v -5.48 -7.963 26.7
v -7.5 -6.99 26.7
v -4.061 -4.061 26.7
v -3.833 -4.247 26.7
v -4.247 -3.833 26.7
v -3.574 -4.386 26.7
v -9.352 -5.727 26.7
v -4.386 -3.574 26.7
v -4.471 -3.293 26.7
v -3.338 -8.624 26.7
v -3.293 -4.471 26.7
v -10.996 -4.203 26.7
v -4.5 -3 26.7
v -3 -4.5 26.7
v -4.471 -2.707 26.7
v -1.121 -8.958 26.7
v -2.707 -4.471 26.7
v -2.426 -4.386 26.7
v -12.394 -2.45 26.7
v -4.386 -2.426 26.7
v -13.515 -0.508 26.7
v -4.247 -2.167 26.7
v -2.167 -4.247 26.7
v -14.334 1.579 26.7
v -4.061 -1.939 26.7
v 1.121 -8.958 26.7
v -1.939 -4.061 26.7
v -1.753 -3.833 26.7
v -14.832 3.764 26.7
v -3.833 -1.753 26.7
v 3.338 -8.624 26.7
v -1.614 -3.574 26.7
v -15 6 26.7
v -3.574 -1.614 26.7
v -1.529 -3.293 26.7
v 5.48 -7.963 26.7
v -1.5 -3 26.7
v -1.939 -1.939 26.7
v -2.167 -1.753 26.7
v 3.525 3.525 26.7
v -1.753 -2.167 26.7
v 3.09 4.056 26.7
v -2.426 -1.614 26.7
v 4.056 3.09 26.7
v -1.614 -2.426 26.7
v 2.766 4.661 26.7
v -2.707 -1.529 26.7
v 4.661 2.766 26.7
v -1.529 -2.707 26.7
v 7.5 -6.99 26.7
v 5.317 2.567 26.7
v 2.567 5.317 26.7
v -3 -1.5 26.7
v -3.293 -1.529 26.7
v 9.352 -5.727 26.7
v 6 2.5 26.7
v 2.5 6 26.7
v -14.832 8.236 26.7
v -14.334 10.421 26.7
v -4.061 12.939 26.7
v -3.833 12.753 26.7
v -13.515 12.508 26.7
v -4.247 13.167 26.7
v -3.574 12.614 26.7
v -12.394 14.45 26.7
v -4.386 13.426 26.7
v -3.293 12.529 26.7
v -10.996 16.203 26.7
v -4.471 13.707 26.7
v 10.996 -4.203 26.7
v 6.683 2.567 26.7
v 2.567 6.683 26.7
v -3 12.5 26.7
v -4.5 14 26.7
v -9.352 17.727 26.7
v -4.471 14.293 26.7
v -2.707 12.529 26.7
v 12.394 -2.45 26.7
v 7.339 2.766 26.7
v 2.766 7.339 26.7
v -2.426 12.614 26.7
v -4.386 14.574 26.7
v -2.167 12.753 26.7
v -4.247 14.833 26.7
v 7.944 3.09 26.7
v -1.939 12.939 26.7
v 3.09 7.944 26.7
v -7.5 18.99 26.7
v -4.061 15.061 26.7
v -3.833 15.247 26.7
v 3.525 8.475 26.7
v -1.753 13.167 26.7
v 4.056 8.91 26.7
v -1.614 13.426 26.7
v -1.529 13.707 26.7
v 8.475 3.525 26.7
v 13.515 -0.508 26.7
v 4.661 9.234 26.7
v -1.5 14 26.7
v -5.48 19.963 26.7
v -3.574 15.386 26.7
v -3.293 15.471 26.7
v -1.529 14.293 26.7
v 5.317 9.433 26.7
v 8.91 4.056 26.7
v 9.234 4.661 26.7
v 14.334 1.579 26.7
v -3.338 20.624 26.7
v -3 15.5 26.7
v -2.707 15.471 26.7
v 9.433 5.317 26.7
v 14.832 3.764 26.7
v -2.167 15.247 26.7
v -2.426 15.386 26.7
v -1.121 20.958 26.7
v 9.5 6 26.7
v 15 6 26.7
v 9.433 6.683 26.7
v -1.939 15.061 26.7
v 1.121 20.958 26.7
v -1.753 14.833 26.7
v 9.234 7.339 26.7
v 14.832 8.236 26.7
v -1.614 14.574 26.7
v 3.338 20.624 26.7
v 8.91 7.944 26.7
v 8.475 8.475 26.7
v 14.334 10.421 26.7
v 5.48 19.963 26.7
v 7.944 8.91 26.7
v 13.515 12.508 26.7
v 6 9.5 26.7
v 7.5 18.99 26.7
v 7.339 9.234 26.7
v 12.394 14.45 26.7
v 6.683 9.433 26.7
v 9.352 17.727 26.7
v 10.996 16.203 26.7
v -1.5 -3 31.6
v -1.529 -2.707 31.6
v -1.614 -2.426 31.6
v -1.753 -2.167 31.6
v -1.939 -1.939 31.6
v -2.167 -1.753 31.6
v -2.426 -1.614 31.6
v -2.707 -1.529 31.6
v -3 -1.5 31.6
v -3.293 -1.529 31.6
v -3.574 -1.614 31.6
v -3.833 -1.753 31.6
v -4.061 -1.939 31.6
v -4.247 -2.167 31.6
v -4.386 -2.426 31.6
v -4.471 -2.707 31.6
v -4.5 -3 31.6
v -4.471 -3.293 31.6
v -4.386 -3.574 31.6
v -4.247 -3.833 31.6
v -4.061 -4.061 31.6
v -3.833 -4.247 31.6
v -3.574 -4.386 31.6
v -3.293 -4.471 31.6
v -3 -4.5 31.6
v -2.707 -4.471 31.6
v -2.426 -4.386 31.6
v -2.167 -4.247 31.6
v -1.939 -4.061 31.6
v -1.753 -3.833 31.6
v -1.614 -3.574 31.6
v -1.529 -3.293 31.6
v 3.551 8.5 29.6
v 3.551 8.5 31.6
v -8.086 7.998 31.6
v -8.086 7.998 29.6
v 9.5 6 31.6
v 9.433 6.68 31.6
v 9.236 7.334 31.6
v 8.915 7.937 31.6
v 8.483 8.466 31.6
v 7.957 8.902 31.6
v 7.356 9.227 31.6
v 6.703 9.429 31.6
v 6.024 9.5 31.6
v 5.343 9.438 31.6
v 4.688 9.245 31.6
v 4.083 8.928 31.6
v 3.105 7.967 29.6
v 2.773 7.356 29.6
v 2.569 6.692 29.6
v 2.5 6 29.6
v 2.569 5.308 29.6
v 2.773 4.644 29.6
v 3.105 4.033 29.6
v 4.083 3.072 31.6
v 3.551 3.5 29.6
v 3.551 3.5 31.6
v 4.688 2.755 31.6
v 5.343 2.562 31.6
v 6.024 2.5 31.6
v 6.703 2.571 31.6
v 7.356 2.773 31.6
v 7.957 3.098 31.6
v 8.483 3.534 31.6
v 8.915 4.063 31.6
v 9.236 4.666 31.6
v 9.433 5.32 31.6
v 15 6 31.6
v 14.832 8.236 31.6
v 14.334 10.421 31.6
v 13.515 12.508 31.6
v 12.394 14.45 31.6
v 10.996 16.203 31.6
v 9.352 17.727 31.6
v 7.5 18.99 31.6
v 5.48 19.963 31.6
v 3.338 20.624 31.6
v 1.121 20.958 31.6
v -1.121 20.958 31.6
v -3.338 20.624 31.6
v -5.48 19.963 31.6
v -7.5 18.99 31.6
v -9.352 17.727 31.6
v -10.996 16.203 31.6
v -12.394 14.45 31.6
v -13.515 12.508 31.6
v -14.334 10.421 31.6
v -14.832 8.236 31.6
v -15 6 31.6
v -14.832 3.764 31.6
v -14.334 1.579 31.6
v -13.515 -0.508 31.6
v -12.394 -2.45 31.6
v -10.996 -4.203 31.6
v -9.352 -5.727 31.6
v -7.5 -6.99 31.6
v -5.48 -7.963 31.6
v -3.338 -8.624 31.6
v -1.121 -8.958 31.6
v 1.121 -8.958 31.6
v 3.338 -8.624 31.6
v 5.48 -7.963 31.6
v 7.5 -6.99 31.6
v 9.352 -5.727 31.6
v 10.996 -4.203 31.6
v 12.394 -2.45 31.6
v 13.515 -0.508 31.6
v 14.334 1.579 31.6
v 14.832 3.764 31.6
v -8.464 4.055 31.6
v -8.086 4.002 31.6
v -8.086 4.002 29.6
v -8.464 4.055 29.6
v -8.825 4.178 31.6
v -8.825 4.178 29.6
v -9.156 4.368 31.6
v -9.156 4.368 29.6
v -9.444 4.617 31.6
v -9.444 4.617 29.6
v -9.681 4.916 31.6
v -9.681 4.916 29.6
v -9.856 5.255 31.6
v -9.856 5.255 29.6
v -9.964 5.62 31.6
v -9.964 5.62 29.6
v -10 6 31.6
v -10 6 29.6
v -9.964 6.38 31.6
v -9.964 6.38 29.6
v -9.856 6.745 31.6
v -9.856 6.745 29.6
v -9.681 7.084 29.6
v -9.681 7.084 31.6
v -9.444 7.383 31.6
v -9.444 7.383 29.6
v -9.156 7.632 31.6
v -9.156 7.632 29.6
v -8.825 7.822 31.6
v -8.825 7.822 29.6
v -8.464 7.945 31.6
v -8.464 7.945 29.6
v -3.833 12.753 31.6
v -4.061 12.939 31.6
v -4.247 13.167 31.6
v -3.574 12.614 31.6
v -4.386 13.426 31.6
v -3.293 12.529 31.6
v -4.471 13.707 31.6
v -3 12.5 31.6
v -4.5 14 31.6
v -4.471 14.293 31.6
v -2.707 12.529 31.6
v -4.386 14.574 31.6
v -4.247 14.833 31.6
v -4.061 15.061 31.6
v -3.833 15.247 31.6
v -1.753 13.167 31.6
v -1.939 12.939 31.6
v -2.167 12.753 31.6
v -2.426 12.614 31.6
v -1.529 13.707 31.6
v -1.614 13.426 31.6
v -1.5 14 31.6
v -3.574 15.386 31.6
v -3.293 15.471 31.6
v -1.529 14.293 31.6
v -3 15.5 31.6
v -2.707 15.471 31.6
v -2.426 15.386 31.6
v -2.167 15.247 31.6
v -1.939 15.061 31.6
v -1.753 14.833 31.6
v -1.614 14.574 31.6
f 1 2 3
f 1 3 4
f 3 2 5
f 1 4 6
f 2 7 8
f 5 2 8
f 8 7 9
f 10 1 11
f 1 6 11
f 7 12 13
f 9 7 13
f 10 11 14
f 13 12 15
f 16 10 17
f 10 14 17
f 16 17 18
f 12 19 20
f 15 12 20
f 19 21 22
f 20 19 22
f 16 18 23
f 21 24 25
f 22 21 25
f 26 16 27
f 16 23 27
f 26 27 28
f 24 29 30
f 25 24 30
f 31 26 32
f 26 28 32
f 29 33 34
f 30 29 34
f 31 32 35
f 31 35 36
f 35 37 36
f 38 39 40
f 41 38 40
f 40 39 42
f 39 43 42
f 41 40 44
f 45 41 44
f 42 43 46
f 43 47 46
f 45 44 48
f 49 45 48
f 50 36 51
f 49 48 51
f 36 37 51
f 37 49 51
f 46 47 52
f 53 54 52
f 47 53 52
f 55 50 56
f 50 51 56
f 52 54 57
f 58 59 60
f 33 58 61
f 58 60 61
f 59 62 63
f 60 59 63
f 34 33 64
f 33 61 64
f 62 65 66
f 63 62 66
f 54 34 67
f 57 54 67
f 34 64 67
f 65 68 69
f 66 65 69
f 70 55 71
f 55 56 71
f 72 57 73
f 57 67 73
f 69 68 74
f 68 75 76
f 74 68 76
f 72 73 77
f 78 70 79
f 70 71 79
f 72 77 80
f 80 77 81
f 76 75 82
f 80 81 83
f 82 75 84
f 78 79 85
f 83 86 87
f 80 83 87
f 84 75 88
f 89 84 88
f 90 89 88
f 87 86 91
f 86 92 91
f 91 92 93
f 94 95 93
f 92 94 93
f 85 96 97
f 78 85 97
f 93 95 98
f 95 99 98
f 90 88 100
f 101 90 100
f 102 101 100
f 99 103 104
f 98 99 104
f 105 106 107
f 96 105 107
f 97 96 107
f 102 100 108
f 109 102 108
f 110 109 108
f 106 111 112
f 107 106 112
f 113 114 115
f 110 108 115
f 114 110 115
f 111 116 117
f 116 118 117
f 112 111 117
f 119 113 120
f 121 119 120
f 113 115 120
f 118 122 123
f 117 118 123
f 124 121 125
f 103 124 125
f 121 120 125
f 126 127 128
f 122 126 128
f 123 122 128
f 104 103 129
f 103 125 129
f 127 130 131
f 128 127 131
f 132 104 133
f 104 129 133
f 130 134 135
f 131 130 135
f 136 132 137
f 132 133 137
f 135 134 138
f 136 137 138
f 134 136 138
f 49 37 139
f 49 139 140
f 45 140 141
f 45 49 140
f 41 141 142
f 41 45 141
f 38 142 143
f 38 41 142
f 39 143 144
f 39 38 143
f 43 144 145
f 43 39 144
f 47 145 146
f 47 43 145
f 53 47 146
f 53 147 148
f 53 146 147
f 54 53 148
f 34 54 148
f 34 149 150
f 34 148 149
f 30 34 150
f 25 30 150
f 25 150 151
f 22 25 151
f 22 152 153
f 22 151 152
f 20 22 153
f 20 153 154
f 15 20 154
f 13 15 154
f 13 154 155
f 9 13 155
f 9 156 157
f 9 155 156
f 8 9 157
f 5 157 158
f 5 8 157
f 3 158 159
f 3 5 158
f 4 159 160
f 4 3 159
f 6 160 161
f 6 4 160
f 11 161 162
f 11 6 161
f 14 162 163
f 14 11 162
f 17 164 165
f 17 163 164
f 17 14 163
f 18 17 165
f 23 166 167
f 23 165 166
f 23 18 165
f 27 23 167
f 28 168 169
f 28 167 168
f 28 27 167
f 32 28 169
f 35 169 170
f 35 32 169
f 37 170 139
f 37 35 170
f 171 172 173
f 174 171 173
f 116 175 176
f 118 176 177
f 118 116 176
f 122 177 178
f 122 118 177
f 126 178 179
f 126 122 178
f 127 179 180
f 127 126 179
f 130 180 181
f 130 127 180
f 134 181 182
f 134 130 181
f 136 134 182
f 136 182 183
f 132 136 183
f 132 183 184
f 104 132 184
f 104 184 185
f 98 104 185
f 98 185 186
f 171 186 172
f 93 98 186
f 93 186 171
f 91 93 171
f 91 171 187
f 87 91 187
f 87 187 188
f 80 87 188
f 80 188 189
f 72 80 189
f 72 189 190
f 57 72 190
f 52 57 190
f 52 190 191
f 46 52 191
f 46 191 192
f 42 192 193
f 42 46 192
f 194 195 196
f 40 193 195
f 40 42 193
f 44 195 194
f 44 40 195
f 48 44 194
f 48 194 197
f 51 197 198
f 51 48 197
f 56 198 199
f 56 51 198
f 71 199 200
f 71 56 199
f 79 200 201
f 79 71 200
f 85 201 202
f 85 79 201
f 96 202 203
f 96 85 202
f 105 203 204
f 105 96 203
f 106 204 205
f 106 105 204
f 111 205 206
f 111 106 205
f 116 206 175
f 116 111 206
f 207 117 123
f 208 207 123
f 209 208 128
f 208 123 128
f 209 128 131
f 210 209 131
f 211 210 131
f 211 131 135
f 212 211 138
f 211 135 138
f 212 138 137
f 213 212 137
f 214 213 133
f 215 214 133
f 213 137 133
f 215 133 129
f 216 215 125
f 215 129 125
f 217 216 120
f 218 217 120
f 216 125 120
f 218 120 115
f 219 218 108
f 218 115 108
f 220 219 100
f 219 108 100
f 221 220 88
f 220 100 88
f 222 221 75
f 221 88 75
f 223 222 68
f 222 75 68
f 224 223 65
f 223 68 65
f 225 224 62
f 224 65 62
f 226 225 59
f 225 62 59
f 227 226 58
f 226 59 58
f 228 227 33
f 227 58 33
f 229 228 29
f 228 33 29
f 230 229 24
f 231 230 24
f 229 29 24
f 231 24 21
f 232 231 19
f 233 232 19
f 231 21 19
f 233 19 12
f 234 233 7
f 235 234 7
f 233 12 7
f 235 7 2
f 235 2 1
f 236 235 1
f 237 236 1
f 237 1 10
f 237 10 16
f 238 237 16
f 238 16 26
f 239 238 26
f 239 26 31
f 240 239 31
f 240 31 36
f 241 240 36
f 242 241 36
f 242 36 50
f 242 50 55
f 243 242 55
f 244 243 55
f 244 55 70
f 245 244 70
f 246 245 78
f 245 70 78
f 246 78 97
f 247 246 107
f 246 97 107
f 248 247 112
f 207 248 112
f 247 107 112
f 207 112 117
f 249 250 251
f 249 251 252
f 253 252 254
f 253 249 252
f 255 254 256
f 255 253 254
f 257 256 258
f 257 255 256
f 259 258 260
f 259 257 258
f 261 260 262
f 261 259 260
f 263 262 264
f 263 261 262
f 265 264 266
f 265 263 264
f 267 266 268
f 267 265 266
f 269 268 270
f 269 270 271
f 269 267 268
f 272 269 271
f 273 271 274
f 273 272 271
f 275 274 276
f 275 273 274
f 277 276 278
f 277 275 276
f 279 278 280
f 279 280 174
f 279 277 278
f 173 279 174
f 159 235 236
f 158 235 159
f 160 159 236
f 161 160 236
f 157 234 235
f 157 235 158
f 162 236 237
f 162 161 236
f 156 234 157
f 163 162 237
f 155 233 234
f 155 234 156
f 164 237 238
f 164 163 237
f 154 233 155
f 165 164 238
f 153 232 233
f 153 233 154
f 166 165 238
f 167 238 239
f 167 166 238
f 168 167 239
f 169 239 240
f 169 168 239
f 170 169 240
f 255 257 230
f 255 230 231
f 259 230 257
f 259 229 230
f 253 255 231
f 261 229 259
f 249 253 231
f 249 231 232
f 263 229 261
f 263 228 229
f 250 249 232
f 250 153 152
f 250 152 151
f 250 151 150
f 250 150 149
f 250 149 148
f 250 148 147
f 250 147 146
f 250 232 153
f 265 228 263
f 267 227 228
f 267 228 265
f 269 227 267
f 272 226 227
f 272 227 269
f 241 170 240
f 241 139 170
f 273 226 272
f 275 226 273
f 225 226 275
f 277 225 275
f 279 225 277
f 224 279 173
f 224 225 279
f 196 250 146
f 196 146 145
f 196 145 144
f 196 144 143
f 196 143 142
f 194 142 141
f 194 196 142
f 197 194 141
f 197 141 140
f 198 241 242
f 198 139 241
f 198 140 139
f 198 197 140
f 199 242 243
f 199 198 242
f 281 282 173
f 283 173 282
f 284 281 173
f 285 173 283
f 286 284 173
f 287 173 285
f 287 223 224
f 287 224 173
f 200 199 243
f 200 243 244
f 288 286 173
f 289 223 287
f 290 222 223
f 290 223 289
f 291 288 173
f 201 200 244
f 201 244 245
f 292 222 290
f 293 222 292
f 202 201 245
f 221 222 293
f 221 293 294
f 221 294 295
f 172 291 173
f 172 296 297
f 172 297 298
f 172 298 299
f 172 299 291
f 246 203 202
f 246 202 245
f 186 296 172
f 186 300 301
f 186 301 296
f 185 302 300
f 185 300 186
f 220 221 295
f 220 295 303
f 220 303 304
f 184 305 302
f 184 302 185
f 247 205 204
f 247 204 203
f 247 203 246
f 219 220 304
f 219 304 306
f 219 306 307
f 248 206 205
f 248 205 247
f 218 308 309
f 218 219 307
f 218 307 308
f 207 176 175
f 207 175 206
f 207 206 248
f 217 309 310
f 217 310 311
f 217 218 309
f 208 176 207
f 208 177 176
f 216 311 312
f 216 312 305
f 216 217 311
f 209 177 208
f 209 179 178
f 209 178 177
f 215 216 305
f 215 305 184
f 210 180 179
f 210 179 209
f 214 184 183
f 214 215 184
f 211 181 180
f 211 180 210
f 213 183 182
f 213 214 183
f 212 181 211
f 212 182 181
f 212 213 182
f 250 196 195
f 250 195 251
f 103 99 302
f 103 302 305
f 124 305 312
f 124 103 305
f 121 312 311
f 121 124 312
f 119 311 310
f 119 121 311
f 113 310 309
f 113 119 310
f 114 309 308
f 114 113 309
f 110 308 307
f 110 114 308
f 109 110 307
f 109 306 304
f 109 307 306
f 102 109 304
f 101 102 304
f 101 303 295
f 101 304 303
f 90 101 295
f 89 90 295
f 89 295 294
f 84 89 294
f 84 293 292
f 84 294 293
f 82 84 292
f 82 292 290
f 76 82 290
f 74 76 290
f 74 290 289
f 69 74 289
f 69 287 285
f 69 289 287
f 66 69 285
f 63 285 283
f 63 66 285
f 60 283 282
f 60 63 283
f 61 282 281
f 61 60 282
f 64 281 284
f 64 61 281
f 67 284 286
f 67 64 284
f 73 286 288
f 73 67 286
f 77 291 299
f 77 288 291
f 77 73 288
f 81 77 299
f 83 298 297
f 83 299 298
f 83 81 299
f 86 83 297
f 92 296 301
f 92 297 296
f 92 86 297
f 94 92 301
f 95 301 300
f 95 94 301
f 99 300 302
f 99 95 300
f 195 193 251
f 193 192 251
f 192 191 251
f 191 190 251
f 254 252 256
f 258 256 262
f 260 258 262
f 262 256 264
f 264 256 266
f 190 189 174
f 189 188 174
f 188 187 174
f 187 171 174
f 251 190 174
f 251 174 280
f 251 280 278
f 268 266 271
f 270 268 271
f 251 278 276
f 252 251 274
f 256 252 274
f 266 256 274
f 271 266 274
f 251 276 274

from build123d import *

# Parameters (mm, degrees)
CYLINDER009_R     = 1.5
CYLINDER009_DEPTH = 10
CYLINDER008_R     = 1.5
CYLINDER008_DEPTH = 10
CYLINDER001_R     = 3.5
CYLINDER001_DEPTH = 20
PAD_DEPTH         = 2
CYLINDER_R        = 15
CYLINDER_DEPTH    = 4.9


with BuildPart() as cilindro009:
    # Cylinder009 → Cylinder009 (new body)
    with BuildSketch(Plane(origin=(-3, 14, 24), x_dir=(1, 0, 0), z_dir=(0, 0, 1))):
        Circle(CYLINDER009_R)
    extrude(amount=CYLINDER009_DEPTH)


with BuildPart() as cilindro008:
    # Cylinder008 → Cylinder008 (new body)
    with BuildSketch(Plane(origin=(-3, -3, 24), x_dir=(1, 0, 0), z_dir=(0, 0, 1))):
        Circle(CYLINDER008_R)
    extrude(amount=CYLINDER008_DEPTH)


with BuildPart() as cilindro001:
    # Cylinder001 → Cylinder001 (new body)
    with BuildSketch(Plane(origin=(6, 6, 22), x_dir=(1, 0, 0), z_dir=(0, 0, 1))):
        Circle(CYLINDER001_R)
    extrude(amount=CYLINDER001_DEPTH)


with BuildPart() as pad:
    # Sketch → Pad (new body)
    with BuildSketch(Plane(origin=(6, 6, 31.6), x_dir=(-1, 0, 0), z_dir=(0, 0, -1))):
        with BuildLine():
            ThreePointArc((14.086174, -1.998143), (16, 0), (14.086174, 1.998143))
            Line((2.44949, 2.5), (14.086174, 1.998143))
            Line((2.44949, 2.5), (2.44949, -2.5))
            Line((2.44949, -2.5), (14.086174, -1.998143))
        make_face()
    extrude(amount=PAD_DEPTH)


with BuildPart() as base:
    # Cylinder → Cylinder (new body)
    with BuildSketch(Plane(origin=(0, 6, 26.7), x_dir=(1, 0, 0), z_dir=(0, 0, 1))):
        Circle(CYLINDER_R)
    extrude(amount=CYLINDER_DEPTH)

    # Cut: cut Pad
    add(pad.part, mode=Mode.SUBTRACT)

    # Cut001: cut Cilindro001
    add(cilindro001.part, mode=Mode.SUBTRACT)

    # Cut009: cut Cilindro008
    add(cilindro008.part, mode=Mode.SUBTRACT)

    # Cut010: cut Cilindro009
    add(cilindro009.part, mode=Mode.SUBTRACT)


solid = base.part
